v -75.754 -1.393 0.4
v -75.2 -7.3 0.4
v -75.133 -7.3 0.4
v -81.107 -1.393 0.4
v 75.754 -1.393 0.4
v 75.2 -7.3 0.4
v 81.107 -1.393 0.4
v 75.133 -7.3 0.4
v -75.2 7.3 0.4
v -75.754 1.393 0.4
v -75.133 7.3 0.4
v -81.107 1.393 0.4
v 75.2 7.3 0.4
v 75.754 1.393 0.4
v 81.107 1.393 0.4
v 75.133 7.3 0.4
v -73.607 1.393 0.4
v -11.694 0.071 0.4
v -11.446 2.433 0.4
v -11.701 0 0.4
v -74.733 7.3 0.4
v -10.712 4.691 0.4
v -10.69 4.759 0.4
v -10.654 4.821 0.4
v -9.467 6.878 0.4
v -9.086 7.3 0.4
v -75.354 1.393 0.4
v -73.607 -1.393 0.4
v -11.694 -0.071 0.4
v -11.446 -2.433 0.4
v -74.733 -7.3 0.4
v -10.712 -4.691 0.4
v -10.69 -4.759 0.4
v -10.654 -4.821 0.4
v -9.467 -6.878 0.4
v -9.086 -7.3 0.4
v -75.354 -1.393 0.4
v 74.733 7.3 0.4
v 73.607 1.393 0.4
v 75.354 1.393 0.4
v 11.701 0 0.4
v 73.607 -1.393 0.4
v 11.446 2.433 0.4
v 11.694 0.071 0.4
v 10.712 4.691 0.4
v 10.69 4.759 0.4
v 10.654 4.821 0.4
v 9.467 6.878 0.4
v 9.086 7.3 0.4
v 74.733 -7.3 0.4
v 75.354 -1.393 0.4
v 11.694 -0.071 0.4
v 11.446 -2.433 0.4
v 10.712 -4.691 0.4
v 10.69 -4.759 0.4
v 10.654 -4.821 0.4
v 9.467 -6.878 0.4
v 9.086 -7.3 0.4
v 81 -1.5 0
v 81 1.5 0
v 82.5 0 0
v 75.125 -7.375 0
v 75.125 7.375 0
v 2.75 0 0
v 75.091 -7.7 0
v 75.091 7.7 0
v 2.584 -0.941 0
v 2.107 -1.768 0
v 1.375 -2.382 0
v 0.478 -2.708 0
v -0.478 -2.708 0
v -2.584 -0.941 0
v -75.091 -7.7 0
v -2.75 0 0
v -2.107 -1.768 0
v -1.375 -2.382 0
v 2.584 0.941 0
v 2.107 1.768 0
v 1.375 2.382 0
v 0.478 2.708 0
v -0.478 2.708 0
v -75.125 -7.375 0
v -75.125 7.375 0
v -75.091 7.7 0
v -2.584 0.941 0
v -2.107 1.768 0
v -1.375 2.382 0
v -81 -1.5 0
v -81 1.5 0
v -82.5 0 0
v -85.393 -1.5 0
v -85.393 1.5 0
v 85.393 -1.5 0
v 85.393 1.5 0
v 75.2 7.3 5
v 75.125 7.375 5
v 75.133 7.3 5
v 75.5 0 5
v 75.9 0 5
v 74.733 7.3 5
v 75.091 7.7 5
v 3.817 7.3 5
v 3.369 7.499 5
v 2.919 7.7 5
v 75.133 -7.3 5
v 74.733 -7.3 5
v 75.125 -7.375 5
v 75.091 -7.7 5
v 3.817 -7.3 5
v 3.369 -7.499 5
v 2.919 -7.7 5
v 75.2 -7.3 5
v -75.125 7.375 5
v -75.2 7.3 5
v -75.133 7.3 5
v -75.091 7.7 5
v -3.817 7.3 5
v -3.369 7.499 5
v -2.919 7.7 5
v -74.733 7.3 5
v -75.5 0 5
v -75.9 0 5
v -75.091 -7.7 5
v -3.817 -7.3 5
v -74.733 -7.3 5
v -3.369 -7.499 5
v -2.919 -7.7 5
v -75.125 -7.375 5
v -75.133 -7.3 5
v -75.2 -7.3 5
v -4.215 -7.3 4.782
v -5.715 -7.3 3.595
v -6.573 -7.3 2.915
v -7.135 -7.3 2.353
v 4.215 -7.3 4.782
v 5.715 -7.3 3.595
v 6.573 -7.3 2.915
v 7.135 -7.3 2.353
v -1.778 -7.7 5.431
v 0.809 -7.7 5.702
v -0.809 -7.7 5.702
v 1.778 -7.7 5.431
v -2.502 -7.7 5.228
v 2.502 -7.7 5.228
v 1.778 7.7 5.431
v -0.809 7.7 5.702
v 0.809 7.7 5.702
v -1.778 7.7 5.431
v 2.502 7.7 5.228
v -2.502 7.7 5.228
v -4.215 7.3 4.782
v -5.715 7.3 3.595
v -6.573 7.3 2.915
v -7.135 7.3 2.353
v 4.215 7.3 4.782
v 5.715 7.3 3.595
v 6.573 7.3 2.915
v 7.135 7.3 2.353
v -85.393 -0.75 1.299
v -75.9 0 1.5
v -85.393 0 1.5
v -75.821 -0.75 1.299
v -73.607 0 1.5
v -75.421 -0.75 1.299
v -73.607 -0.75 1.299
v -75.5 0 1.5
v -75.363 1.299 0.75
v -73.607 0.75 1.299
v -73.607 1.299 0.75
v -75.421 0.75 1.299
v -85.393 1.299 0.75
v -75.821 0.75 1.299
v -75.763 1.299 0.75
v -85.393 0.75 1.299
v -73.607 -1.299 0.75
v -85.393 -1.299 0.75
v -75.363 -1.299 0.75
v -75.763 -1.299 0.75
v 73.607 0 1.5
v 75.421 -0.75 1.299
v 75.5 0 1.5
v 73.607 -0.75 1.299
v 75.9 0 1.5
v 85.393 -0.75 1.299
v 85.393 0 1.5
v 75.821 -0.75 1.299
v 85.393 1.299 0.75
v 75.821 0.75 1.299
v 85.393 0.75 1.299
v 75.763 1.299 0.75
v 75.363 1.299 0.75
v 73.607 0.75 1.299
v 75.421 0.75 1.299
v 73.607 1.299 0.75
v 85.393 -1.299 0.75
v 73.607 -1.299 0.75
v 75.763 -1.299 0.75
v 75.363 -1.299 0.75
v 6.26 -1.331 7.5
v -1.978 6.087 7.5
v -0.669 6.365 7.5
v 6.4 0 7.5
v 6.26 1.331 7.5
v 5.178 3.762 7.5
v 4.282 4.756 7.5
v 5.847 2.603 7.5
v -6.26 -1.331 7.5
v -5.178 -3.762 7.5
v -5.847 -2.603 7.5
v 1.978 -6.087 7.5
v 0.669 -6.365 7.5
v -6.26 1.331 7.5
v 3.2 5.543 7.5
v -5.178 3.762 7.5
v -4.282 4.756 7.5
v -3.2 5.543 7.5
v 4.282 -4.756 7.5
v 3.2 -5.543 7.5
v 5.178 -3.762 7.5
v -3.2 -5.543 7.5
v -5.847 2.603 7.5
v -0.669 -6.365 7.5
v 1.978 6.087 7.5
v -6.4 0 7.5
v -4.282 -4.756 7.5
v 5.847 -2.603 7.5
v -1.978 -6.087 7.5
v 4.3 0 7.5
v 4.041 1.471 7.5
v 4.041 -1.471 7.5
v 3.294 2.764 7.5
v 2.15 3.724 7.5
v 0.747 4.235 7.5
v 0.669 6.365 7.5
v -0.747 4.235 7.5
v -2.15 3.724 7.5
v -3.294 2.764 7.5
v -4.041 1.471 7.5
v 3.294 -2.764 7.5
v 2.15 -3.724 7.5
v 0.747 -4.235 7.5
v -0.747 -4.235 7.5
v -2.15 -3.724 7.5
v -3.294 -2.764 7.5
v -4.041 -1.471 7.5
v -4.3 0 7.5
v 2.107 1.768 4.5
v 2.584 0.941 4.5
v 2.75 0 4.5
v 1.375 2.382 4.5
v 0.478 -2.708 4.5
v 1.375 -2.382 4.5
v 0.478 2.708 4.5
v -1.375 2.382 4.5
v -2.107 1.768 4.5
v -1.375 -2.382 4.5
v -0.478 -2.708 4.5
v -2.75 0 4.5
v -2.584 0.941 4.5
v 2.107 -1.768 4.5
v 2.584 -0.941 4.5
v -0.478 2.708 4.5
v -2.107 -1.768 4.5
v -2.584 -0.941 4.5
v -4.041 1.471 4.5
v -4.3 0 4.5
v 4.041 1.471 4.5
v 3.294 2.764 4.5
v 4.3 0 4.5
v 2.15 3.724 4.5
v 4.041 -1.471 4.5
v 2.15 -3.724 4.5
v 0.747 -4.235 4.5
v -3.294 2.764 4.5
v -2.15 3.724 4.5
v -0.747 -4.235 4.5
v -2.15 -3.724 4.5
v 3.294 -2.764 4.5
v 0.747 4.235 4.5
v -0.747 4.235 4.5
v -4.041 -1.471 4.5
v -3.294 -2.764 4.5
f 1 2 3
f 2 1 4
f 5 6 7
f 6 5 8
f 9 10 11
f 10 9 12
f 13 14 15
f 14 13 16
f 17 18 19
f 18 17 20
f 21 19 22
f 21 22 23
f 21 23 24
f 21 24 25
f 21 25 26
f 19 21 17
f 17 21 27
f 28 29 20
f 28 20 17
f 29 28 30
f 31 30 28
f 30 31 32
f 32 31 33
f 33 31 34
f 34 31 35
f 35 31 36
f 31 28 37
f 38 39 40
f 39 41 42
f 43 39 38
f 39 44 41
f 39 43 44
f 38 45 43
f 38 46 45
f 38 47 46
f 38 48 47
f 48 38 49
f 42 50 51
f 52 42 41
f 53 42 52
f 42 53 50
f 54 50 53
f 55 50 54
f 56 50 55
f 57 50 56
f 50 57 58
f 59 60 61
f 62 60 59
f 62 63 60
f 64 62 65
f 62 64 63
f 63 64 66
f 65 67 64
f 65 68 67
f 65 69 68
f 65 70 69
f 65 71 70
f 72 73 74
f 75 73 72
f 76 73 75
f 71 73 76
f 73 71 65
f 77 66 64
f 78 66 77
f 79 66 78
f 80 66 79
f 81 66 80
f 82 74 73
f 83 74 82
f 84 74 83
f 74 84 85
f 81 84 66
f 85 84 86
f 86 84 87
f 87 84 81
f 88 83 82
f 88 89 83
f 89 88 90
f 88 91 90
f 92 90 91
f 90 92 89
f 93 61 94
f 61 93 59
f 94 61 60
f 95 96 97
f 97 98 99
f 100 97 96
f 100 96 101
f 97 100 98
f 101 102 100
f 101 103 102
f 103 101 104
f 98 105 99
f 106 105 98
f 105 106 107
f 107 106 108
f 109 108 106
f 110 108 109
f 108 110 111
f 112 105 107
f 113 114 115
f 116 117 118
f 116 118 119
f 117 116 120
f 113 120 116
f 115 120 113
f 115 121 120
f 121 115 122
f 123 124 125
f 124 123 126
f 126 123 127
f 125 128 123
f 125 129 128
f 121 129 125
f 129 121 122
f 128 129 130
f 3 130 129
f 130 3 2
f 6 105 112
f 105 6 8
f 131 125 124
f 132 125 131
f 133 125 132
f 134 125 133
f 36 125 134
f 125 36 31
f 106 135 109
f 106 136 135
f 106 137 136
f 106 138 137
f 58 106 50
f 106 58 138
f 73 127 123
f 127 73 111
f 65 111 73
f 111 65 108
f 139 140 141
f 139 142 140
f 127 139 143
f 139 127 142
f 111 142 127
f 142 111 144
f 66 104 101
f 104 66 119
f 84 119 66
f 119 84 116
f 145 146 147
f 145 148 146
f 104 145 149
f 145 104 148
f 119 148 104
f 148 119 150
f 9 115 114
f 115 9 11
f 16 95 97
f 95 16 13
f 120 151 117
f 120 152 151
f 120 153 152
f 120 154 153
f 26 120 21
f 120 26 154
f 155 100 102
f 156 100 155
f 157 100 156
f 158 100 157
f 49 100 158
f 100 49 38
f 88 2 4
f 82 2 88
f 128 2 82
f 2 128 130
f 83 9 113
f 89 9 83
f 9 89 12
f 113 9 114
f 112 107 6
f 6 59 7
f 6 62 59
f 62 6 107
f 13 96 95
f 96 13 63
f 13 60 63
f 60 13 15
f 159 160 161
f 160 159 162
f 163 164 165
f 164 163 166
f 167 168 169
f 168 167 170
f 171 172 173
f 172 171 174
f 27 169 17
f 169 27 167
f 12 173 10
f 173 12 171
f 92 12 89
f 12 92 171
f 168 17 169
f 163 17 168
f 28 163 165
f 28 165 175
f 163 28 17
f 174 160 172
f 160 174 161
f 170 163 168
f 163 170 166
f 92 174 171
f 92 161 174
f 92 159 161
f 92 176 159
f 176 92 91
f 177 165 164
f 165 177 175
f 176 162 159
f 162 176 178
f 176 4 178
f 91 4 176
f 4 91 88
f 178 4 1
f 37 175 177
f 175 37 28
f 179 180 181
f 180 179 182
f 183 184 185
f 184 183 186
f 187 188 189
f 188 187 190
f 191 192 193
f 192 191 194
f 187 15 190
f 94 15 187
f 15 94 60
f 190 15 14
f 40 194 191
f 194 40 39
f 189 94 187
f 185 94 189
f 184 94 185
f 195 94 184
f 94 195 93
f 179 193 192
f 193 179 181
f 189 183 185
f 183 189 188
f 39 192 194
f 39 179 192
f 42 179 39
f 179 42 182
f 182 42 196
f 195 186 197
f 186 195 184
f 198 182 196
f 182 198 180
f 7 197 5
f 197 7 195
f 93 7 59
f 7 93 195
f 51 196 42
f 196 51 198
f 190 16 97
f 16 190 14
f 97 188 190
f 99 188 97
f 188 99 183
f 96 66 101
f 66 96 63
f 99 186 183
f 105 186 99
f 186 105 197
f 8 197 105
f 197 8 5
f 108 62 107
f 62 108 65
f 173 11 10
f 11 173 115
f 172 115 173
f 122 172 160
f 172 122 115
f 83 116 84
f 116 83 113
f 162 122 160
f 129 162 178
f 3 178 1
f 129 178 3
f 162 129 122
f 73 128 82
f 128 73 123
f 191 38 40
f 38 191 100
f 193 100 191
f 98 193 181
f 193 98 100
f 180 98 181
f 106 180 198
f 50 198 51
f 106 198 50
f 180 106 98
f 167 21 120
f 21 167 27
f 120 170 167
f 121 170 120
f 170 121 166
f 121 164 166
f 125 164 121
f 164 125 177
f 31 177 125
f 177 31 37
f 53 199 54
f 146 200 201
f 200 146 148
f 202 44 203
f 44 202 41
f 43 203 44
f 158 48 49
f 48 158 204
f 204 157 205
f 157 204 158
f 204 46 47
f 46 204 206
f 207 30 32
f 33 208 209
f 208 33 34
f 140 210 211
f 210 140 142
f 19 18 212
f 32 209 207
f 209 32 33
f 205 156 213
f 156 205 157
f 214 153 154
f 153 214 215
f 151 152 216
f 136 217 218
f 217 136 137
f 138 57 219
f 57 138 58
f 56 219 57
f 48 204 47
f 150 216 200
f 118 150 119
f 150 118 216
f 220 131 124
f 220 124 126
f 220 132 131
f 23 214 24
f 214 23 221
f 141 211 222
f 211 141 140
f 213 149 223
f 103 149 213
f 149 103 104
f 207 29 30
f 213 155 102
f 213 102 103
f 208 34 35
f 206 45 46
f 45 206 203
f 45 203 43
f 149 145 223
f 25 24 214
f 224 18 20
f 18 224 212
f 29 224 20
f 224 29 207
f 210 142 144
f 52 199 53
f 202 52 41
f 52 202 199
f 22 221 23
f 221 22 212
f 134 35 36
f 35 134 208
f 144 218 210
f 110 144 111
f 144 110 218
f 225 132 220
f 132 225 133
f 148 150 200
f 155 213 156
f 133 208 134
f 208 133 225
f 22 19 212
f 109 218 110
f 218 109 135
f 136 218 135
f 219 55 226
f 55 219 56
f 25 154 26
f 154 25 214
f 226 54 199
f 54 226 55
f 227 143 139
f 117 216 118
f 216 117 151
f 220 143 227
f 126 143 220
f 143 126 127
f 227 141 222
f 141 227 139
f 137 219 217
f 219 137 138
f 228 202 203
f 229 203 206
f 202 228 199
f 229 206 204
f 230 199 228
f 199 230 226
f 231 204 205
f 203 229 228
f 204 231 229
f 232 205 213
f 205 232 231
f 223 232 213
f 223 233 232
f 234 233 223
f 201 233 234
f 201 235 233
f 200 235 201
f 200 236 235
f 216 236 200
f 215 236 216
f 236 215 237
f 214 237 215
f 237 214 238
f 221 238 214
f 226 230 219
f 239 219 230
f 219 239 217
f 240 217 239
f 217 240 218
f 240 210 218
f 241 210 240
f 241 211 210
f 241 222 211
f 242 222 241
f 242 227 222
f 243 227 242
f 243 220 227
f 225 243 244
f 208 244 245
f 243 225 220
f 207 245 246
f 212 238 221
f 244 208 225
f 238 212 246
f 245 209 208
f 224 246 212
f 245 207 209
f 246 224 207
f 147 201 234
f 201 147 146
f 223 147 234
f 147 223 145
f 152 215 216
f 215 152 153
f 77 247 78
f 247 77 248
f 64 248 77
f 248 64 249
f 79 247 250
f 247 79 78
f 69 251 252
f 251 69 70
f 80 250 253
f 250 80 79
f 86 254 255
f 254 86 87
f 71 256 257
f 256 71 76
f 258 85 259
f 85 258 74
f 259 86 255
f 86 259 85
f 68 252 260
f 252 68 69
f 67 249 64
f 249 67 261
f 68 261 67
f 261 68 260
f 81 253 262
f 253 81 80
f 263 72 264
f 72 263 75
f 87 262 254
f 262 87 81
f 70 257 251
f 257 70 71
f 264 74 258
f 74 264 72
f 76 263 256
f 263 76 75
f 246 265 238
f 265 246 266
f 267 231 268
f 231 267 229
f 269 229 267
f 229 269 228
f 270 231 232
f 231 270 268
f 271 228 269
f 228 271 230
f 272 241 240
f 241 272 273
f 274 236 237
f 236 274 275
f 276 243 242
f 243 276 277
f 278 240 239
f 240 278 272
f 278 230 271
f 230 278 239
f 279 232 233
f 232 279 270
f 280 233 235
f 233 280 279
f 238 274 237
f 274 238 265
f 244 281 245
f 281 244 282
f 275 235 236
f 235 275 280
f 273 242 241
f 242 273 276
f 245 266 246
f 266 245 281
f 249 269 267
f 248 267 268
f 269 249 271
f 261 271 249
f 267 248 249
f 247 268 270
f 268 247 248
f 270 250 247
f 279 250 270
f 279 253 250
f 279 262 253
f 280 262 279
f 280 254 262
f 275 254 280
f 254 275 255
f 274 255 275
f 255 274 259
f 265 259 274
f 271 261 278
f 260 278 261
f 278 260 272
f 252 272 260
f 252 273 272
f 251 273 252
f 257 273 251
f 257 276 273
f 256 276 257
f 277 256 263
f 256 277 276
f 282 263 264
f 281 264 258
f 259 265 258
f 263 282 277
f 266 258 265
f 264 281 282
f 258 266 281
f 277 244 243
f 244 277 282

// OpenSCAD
SZ = 30;

SHAFT_D = 3;
BEARING_D = 8;
middle_d = (SHAFT_D + BEARING_D) / 2;
BEARING_W = 3;
BEARING_HOLE = SHAFT_D;
WINDADGE = 0.6;

module reel(outer_d, inner_d, h) {
    half_d = (outer_d + inner_d) / 2;
    translate([0,0,h/2]) difference() {
        // main body
        cylinder(d=outer_d, h=h, center=true);
        // center hole
        cylinder(d=inner_d, h=2*h, center=true);
        // torus
        rotate_extrude(angle=360,convexity=2) translate([outer_d*1.15/2,0,0]) circle(d=h);
        // slits for thread
        for(i = [1:6]) rotate([0,0,i*60]) cube([WINDADGE, 1000, 1000], center=true);
        //for(i = [1:6]) rotate([0,0,i*60]) translate([0,500+half_d/2,0]) cube([WINDADGE, 1000, 1000], center=true);
        
    }
}

*translate([0,0,SZ*2/3/2]) translate([0, 50, 0]) difference() {
    union() {
        cube([3*SZ,SZ,SZ*2/3], center=true);
        translate([0,0,SZ*2/3/2]) reel(outer_d=SZ/2, inner_d=SZ/4, h=SZ/5);
    }
    //translate([0,0,1000/2-WINDADGE]) 
    cylinder(d=SHAFT_D+WINDADGE, h=1000, center=true, $fn=12);
    // weight holes
    for(i = [-1, +1]) translate([i*SZ/2,0,0]) cylinder(d=SZ/2, h=1000, center=true);
}

*translate([0,0,SZ*2/3/2]) translate([0, -50, 0]) difference() {
    // shaft hole
    union() {
        cube([4*SZ,SZ*3/4,SZ*2/3], center=true);
        translate([0,0,SZ*2/3/2]) reel(outer_d=SZ/2, inner_d=SZ/4, h=SZ/5);
    }
    // shaft hole
    //translate([0,0,1000/2-WINDADGE]) 
    cylinder(d=SHAFT_D+WINDADGE, h=1000, center=true, $fn=12);
    // weight holes
    for(i = [-1, +1]) translate([i*SZ/2,0,0]) cylinder(d=SZ/2, h=1000, center=true);
}

th = 0.4;//SZ / 100*2;
ibeam_l = 5.5*SZ; // 5*SZ
ibeam_w = SZ/2; // SZ*2/3
beam_h = SZ/6;
cone_h = SZ/4;

difference() {
    union() {
        // axle support
        translate([0,0,cone_h/2]) cylinder(d1=ibeam_w*1.6, d2=1.6*BEARING_D, h=cone_h, center=true);
        intersection() {
            union() {
                // I-beam vertical
                translate([0,0,th/2]) cube([ibeam_l ,ibeam_w, th], center=true);
                // I-beam sides
                translate([0,-ibeam_w/2,beam_h/2]) cube([ibeam_l ,th, beam_h], center=true);
                translate([0,+ibeam_w/2,beam_h/2]) cube([ibeam_l ,th, beam_h], center=true);
            }
            rotate([0,0,45]) cube([ibeam_l/sqrt(2), ibeam_l/sqrt(2), 1000], center=true);
        }
        // side axles
        for(i =[-1, +1]) difference() {
            translate([i*(ibeam_l/2-BEARING_W),0,0]) rotate([0,90,0]) cylinder(d=BEARING_HOLE, h=ibeam_l/14, center=true, $fn=12);
            translate([0,0,-500]) cube([1000,1000,1000], center=true);
        }
        // side axle support
        translate([0,0,beam_h/2]) difference() {
            cylinder(d=ibeam_l*0.92, h=beam_h, center=true);
            cylinder(d=ibeam_l*0.92-2*th, h=beam_h, center=true);
        }
    }
    // axle hole
    cylinder(d=middle_d, h=1000, center=true, $fn=18);
    // bearing hole
    translate([0,0,1000/2+cone_h-BEARING_W]) cylinder(d=BEARING_D+WINDADGE, h=1000, center=true, $fn=18);
    // cut cone sides
    translate([0,+500+ibeam_w/2+th/2,0]) cube([1000,1000,1000], center=true);
    translate([0,-500-ibeam_w/2-th/2,0]) cube([1000,1000,1000], center=true);
}
